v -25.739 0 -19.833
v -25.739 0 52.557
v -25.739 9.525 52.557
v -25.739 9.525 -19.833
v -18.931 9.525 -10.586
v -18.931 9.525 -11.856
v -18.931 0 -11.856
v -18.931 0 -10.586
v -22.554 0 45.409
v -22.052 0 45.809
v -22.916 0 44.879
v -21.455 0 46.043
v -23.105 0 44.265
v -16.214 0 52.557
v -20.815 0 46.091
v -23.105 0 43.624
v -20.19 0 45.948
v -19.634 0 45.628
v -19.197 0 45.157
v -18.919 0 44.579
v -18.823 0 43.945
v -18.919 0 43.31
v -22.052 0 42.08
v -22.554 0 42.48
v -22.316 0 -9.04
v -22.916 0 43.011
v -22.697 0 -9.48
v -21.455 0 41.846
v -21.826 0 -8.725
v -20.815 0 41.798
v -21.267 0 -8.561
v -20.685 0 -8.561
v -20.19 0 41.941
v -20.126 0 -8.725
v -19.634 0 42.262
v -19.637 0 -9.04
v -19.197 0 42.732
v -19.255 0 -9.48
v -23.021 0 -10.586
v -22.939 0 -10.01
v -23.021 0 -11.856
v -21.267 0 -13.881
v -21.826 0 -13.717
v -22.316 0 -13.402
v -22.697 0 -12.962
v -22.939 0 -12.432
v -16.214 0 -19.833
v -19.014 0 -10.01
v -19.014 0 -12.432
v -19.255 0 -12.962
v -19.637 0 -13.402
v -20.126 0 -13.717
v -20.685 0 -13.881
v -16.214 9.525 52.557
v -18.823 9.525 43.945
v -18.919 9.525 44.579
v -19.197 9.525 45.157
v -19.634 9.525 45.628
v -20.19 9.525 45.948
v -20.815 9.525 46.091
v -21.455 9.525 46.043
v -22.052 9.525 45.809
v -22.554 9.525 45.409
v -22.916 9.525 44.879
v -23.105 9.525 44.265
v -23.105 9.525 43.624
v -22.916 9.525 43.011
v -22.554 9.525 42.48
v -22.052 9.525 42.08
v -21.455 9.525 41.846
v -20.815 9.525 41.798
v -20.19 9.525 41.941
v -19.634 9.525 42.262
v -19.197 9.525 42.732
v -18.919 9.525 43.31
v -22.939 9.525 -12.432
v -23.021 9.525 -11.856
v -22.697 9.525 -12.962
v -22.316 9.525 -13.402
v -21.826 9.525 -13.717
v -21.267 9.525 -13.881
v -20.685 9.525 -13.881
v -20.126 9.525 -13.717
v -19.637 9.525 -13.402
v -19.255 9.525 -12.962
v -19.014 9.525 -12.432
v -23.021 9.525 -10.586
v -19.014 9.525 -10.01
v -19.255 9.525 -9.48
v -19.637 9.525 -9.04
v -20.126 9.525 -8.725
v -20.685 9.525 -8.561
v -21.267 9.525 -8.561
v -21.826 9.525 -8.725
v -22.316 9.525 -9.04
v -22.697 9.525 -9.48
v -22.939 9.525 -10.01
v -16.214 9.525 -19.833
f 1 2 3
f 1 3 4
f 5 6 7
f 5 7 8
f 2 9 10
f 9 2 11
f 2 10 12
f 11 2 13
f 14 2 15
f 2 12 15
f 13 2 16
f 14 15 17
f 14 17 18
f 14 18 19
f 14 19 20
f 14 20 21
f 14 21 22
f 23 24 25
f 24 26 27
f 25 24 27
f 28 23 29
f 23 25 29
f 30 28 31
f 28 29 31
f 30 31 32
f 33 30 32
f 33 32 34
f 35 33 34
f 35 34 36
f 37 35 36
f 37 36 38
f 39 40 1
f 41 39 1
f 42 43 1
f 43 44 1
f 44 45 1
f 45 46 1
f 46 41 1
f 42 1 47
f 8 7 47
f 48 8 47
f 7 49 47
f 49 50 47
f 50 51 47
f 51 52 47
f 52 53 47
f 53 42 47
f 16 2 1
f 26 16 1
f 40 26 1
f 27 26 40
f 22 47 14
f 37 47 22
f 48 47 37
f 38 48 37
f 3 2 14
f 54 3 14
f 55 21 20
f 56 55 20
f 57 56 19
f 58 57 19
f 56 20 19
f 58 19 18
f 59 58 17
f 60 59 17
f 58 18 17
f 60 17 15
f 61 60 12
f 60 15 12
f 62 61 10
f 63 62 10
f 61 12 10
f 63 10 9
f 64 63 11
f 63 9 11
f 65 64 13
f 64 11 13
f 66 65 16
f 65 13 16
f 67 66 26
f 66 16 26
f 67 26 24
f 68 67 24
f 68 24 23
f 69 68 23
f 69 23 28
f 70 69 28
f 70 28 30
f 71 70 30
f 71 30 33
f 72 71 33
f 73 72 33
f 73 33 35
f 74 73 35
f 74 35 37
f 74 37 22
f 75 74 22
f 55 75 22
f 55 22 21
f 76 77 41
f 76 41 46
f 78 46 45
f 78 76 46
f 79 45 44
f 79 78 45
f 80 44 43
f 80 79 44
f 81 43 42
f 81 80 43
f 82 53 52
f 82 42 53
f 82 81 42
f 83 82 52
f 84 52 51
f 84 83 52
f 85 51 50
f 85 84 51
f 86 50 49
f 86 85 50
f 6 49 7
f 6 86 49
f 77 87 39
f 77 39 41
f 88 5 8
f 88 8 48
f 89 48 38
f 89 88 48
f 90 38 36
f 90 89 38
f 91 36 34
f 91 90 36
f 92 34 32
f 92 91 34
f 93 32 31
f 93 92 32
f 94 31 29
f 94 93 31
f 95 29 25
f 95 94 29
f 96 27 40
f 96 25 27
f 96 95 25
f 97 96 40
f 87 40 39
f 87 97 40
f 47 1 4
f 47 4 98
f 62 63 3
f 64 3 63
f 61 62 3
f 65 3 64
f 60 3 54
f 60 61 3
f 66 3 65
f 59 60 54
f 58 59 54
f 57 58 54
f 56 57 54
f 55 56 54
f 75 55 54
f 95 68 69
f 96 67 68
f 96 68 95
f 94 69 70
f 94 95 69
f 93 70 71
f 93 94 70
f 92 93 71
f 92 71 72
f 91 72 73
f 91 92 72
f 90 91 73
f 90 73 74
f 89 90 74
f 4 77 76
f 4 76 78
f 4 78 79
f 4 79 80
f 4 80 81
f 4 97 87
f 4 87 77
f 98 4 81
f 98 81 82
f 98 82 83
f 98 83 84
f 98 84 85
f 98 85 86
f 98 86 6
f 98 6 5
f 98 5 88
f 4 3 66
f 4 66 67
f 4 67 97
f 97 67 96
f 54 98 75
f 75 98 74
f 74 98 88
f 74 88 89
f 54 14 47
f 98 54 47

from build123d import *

# Parameters (mm, degrees)
SKETCH1_W                        = 9.525
SKETCH1_H                        = 72.39
BOSS_EXTRUDE1_DEPTH              = 9.525
F_18_0_1695_DIAMETER_HOLE1_D     = 4.3053
F_18_0_1695_DIAMETER_HOLE1_DEPTH = 15.24
F_18_0_1695_DIAMETER_HOLE1_TIP   = 1.293442612
CUT_EXTRUDE1_REACH               = 11.525


with BuildPart() as part:
    # Sketch1 → Boss-Extrude1 (new body)
    with BuildSketch(Plane(origin=(0, 0, 0), x_dir=(1, 0, 0), z_dir=(0, 1, 0))):
        with Locations((-20.976080696, -16.361756412)):
            Rectangle(SKETCH1_W, SKETCH1_H)
    extrude(amount=BOSS_EXTRUDE1_DEPTH)

    # #18 (0.1695) Diameter Hole1
    with Locations(Plane(origin=(0, 9.525, 0), x_dir=(-1, 0, 0), z_dir=(0, 1, 0))):
        with Locations((20.976080696, 43.944568912)):
            Hole(F_18_0_1695_DIAMETER_HOLE1_D / 2, depth=F_18_0_1695_DIAMETER_HOLE1_DEPTH)
            with Locations((0, 0, -(F_18_0_1695_DIAMETER_HOLE1_DEPTH + F_18_0_1695_DIAMETER_HOLE1_TIP / 2))):  # 118° drill point
                Cone(0, F_18_0_1695_DIAMETER_HOLE1_D / 2, F_18_0_1695_DIAMETER_HOLE1_TIP, mode=Mode.SUBTRACT)

    # Sketch4 → Cut-Extrude1 (cut, up to next)
    with BuildSketch(Plane(origin=(0, 9.525, 0), x_dir=(1, 0, 0), z_dir=(0, 1, 0)), mode=Mode.PRIVATE) as cut_extrude1_sk1:
        with BuildLine():
            Line((-18.9306781, 11.856056088), (-18.9306781, 10.586056088))
            ThreePointArc((-18.9306781, 10.586056088), (-20.976080696, 8.540653493), (-23.021483291, 10.586056088))
            Line((-23.021483291, 10.586056088), (-23.021483291, 11.856056088))
            ThreePointArc((-23.021483291, 11.856056088), (-20.976080696, 13.901458684), (-18.9306781, 11.856056088))
        make_face()
    cut_extrude1_tool1 = extrude(cut_extrude1_sk1.sketch, amount=-CUT_EXTRUDE1_REACH, mode=Mode.PRIVATE) & part.part
    add(cut_extrude1_tool1.solids().sort_by_distance((-20.976081, 9.525, -11.221056))[0], mode=Mode.SUBTRACT)


solid = part.part
